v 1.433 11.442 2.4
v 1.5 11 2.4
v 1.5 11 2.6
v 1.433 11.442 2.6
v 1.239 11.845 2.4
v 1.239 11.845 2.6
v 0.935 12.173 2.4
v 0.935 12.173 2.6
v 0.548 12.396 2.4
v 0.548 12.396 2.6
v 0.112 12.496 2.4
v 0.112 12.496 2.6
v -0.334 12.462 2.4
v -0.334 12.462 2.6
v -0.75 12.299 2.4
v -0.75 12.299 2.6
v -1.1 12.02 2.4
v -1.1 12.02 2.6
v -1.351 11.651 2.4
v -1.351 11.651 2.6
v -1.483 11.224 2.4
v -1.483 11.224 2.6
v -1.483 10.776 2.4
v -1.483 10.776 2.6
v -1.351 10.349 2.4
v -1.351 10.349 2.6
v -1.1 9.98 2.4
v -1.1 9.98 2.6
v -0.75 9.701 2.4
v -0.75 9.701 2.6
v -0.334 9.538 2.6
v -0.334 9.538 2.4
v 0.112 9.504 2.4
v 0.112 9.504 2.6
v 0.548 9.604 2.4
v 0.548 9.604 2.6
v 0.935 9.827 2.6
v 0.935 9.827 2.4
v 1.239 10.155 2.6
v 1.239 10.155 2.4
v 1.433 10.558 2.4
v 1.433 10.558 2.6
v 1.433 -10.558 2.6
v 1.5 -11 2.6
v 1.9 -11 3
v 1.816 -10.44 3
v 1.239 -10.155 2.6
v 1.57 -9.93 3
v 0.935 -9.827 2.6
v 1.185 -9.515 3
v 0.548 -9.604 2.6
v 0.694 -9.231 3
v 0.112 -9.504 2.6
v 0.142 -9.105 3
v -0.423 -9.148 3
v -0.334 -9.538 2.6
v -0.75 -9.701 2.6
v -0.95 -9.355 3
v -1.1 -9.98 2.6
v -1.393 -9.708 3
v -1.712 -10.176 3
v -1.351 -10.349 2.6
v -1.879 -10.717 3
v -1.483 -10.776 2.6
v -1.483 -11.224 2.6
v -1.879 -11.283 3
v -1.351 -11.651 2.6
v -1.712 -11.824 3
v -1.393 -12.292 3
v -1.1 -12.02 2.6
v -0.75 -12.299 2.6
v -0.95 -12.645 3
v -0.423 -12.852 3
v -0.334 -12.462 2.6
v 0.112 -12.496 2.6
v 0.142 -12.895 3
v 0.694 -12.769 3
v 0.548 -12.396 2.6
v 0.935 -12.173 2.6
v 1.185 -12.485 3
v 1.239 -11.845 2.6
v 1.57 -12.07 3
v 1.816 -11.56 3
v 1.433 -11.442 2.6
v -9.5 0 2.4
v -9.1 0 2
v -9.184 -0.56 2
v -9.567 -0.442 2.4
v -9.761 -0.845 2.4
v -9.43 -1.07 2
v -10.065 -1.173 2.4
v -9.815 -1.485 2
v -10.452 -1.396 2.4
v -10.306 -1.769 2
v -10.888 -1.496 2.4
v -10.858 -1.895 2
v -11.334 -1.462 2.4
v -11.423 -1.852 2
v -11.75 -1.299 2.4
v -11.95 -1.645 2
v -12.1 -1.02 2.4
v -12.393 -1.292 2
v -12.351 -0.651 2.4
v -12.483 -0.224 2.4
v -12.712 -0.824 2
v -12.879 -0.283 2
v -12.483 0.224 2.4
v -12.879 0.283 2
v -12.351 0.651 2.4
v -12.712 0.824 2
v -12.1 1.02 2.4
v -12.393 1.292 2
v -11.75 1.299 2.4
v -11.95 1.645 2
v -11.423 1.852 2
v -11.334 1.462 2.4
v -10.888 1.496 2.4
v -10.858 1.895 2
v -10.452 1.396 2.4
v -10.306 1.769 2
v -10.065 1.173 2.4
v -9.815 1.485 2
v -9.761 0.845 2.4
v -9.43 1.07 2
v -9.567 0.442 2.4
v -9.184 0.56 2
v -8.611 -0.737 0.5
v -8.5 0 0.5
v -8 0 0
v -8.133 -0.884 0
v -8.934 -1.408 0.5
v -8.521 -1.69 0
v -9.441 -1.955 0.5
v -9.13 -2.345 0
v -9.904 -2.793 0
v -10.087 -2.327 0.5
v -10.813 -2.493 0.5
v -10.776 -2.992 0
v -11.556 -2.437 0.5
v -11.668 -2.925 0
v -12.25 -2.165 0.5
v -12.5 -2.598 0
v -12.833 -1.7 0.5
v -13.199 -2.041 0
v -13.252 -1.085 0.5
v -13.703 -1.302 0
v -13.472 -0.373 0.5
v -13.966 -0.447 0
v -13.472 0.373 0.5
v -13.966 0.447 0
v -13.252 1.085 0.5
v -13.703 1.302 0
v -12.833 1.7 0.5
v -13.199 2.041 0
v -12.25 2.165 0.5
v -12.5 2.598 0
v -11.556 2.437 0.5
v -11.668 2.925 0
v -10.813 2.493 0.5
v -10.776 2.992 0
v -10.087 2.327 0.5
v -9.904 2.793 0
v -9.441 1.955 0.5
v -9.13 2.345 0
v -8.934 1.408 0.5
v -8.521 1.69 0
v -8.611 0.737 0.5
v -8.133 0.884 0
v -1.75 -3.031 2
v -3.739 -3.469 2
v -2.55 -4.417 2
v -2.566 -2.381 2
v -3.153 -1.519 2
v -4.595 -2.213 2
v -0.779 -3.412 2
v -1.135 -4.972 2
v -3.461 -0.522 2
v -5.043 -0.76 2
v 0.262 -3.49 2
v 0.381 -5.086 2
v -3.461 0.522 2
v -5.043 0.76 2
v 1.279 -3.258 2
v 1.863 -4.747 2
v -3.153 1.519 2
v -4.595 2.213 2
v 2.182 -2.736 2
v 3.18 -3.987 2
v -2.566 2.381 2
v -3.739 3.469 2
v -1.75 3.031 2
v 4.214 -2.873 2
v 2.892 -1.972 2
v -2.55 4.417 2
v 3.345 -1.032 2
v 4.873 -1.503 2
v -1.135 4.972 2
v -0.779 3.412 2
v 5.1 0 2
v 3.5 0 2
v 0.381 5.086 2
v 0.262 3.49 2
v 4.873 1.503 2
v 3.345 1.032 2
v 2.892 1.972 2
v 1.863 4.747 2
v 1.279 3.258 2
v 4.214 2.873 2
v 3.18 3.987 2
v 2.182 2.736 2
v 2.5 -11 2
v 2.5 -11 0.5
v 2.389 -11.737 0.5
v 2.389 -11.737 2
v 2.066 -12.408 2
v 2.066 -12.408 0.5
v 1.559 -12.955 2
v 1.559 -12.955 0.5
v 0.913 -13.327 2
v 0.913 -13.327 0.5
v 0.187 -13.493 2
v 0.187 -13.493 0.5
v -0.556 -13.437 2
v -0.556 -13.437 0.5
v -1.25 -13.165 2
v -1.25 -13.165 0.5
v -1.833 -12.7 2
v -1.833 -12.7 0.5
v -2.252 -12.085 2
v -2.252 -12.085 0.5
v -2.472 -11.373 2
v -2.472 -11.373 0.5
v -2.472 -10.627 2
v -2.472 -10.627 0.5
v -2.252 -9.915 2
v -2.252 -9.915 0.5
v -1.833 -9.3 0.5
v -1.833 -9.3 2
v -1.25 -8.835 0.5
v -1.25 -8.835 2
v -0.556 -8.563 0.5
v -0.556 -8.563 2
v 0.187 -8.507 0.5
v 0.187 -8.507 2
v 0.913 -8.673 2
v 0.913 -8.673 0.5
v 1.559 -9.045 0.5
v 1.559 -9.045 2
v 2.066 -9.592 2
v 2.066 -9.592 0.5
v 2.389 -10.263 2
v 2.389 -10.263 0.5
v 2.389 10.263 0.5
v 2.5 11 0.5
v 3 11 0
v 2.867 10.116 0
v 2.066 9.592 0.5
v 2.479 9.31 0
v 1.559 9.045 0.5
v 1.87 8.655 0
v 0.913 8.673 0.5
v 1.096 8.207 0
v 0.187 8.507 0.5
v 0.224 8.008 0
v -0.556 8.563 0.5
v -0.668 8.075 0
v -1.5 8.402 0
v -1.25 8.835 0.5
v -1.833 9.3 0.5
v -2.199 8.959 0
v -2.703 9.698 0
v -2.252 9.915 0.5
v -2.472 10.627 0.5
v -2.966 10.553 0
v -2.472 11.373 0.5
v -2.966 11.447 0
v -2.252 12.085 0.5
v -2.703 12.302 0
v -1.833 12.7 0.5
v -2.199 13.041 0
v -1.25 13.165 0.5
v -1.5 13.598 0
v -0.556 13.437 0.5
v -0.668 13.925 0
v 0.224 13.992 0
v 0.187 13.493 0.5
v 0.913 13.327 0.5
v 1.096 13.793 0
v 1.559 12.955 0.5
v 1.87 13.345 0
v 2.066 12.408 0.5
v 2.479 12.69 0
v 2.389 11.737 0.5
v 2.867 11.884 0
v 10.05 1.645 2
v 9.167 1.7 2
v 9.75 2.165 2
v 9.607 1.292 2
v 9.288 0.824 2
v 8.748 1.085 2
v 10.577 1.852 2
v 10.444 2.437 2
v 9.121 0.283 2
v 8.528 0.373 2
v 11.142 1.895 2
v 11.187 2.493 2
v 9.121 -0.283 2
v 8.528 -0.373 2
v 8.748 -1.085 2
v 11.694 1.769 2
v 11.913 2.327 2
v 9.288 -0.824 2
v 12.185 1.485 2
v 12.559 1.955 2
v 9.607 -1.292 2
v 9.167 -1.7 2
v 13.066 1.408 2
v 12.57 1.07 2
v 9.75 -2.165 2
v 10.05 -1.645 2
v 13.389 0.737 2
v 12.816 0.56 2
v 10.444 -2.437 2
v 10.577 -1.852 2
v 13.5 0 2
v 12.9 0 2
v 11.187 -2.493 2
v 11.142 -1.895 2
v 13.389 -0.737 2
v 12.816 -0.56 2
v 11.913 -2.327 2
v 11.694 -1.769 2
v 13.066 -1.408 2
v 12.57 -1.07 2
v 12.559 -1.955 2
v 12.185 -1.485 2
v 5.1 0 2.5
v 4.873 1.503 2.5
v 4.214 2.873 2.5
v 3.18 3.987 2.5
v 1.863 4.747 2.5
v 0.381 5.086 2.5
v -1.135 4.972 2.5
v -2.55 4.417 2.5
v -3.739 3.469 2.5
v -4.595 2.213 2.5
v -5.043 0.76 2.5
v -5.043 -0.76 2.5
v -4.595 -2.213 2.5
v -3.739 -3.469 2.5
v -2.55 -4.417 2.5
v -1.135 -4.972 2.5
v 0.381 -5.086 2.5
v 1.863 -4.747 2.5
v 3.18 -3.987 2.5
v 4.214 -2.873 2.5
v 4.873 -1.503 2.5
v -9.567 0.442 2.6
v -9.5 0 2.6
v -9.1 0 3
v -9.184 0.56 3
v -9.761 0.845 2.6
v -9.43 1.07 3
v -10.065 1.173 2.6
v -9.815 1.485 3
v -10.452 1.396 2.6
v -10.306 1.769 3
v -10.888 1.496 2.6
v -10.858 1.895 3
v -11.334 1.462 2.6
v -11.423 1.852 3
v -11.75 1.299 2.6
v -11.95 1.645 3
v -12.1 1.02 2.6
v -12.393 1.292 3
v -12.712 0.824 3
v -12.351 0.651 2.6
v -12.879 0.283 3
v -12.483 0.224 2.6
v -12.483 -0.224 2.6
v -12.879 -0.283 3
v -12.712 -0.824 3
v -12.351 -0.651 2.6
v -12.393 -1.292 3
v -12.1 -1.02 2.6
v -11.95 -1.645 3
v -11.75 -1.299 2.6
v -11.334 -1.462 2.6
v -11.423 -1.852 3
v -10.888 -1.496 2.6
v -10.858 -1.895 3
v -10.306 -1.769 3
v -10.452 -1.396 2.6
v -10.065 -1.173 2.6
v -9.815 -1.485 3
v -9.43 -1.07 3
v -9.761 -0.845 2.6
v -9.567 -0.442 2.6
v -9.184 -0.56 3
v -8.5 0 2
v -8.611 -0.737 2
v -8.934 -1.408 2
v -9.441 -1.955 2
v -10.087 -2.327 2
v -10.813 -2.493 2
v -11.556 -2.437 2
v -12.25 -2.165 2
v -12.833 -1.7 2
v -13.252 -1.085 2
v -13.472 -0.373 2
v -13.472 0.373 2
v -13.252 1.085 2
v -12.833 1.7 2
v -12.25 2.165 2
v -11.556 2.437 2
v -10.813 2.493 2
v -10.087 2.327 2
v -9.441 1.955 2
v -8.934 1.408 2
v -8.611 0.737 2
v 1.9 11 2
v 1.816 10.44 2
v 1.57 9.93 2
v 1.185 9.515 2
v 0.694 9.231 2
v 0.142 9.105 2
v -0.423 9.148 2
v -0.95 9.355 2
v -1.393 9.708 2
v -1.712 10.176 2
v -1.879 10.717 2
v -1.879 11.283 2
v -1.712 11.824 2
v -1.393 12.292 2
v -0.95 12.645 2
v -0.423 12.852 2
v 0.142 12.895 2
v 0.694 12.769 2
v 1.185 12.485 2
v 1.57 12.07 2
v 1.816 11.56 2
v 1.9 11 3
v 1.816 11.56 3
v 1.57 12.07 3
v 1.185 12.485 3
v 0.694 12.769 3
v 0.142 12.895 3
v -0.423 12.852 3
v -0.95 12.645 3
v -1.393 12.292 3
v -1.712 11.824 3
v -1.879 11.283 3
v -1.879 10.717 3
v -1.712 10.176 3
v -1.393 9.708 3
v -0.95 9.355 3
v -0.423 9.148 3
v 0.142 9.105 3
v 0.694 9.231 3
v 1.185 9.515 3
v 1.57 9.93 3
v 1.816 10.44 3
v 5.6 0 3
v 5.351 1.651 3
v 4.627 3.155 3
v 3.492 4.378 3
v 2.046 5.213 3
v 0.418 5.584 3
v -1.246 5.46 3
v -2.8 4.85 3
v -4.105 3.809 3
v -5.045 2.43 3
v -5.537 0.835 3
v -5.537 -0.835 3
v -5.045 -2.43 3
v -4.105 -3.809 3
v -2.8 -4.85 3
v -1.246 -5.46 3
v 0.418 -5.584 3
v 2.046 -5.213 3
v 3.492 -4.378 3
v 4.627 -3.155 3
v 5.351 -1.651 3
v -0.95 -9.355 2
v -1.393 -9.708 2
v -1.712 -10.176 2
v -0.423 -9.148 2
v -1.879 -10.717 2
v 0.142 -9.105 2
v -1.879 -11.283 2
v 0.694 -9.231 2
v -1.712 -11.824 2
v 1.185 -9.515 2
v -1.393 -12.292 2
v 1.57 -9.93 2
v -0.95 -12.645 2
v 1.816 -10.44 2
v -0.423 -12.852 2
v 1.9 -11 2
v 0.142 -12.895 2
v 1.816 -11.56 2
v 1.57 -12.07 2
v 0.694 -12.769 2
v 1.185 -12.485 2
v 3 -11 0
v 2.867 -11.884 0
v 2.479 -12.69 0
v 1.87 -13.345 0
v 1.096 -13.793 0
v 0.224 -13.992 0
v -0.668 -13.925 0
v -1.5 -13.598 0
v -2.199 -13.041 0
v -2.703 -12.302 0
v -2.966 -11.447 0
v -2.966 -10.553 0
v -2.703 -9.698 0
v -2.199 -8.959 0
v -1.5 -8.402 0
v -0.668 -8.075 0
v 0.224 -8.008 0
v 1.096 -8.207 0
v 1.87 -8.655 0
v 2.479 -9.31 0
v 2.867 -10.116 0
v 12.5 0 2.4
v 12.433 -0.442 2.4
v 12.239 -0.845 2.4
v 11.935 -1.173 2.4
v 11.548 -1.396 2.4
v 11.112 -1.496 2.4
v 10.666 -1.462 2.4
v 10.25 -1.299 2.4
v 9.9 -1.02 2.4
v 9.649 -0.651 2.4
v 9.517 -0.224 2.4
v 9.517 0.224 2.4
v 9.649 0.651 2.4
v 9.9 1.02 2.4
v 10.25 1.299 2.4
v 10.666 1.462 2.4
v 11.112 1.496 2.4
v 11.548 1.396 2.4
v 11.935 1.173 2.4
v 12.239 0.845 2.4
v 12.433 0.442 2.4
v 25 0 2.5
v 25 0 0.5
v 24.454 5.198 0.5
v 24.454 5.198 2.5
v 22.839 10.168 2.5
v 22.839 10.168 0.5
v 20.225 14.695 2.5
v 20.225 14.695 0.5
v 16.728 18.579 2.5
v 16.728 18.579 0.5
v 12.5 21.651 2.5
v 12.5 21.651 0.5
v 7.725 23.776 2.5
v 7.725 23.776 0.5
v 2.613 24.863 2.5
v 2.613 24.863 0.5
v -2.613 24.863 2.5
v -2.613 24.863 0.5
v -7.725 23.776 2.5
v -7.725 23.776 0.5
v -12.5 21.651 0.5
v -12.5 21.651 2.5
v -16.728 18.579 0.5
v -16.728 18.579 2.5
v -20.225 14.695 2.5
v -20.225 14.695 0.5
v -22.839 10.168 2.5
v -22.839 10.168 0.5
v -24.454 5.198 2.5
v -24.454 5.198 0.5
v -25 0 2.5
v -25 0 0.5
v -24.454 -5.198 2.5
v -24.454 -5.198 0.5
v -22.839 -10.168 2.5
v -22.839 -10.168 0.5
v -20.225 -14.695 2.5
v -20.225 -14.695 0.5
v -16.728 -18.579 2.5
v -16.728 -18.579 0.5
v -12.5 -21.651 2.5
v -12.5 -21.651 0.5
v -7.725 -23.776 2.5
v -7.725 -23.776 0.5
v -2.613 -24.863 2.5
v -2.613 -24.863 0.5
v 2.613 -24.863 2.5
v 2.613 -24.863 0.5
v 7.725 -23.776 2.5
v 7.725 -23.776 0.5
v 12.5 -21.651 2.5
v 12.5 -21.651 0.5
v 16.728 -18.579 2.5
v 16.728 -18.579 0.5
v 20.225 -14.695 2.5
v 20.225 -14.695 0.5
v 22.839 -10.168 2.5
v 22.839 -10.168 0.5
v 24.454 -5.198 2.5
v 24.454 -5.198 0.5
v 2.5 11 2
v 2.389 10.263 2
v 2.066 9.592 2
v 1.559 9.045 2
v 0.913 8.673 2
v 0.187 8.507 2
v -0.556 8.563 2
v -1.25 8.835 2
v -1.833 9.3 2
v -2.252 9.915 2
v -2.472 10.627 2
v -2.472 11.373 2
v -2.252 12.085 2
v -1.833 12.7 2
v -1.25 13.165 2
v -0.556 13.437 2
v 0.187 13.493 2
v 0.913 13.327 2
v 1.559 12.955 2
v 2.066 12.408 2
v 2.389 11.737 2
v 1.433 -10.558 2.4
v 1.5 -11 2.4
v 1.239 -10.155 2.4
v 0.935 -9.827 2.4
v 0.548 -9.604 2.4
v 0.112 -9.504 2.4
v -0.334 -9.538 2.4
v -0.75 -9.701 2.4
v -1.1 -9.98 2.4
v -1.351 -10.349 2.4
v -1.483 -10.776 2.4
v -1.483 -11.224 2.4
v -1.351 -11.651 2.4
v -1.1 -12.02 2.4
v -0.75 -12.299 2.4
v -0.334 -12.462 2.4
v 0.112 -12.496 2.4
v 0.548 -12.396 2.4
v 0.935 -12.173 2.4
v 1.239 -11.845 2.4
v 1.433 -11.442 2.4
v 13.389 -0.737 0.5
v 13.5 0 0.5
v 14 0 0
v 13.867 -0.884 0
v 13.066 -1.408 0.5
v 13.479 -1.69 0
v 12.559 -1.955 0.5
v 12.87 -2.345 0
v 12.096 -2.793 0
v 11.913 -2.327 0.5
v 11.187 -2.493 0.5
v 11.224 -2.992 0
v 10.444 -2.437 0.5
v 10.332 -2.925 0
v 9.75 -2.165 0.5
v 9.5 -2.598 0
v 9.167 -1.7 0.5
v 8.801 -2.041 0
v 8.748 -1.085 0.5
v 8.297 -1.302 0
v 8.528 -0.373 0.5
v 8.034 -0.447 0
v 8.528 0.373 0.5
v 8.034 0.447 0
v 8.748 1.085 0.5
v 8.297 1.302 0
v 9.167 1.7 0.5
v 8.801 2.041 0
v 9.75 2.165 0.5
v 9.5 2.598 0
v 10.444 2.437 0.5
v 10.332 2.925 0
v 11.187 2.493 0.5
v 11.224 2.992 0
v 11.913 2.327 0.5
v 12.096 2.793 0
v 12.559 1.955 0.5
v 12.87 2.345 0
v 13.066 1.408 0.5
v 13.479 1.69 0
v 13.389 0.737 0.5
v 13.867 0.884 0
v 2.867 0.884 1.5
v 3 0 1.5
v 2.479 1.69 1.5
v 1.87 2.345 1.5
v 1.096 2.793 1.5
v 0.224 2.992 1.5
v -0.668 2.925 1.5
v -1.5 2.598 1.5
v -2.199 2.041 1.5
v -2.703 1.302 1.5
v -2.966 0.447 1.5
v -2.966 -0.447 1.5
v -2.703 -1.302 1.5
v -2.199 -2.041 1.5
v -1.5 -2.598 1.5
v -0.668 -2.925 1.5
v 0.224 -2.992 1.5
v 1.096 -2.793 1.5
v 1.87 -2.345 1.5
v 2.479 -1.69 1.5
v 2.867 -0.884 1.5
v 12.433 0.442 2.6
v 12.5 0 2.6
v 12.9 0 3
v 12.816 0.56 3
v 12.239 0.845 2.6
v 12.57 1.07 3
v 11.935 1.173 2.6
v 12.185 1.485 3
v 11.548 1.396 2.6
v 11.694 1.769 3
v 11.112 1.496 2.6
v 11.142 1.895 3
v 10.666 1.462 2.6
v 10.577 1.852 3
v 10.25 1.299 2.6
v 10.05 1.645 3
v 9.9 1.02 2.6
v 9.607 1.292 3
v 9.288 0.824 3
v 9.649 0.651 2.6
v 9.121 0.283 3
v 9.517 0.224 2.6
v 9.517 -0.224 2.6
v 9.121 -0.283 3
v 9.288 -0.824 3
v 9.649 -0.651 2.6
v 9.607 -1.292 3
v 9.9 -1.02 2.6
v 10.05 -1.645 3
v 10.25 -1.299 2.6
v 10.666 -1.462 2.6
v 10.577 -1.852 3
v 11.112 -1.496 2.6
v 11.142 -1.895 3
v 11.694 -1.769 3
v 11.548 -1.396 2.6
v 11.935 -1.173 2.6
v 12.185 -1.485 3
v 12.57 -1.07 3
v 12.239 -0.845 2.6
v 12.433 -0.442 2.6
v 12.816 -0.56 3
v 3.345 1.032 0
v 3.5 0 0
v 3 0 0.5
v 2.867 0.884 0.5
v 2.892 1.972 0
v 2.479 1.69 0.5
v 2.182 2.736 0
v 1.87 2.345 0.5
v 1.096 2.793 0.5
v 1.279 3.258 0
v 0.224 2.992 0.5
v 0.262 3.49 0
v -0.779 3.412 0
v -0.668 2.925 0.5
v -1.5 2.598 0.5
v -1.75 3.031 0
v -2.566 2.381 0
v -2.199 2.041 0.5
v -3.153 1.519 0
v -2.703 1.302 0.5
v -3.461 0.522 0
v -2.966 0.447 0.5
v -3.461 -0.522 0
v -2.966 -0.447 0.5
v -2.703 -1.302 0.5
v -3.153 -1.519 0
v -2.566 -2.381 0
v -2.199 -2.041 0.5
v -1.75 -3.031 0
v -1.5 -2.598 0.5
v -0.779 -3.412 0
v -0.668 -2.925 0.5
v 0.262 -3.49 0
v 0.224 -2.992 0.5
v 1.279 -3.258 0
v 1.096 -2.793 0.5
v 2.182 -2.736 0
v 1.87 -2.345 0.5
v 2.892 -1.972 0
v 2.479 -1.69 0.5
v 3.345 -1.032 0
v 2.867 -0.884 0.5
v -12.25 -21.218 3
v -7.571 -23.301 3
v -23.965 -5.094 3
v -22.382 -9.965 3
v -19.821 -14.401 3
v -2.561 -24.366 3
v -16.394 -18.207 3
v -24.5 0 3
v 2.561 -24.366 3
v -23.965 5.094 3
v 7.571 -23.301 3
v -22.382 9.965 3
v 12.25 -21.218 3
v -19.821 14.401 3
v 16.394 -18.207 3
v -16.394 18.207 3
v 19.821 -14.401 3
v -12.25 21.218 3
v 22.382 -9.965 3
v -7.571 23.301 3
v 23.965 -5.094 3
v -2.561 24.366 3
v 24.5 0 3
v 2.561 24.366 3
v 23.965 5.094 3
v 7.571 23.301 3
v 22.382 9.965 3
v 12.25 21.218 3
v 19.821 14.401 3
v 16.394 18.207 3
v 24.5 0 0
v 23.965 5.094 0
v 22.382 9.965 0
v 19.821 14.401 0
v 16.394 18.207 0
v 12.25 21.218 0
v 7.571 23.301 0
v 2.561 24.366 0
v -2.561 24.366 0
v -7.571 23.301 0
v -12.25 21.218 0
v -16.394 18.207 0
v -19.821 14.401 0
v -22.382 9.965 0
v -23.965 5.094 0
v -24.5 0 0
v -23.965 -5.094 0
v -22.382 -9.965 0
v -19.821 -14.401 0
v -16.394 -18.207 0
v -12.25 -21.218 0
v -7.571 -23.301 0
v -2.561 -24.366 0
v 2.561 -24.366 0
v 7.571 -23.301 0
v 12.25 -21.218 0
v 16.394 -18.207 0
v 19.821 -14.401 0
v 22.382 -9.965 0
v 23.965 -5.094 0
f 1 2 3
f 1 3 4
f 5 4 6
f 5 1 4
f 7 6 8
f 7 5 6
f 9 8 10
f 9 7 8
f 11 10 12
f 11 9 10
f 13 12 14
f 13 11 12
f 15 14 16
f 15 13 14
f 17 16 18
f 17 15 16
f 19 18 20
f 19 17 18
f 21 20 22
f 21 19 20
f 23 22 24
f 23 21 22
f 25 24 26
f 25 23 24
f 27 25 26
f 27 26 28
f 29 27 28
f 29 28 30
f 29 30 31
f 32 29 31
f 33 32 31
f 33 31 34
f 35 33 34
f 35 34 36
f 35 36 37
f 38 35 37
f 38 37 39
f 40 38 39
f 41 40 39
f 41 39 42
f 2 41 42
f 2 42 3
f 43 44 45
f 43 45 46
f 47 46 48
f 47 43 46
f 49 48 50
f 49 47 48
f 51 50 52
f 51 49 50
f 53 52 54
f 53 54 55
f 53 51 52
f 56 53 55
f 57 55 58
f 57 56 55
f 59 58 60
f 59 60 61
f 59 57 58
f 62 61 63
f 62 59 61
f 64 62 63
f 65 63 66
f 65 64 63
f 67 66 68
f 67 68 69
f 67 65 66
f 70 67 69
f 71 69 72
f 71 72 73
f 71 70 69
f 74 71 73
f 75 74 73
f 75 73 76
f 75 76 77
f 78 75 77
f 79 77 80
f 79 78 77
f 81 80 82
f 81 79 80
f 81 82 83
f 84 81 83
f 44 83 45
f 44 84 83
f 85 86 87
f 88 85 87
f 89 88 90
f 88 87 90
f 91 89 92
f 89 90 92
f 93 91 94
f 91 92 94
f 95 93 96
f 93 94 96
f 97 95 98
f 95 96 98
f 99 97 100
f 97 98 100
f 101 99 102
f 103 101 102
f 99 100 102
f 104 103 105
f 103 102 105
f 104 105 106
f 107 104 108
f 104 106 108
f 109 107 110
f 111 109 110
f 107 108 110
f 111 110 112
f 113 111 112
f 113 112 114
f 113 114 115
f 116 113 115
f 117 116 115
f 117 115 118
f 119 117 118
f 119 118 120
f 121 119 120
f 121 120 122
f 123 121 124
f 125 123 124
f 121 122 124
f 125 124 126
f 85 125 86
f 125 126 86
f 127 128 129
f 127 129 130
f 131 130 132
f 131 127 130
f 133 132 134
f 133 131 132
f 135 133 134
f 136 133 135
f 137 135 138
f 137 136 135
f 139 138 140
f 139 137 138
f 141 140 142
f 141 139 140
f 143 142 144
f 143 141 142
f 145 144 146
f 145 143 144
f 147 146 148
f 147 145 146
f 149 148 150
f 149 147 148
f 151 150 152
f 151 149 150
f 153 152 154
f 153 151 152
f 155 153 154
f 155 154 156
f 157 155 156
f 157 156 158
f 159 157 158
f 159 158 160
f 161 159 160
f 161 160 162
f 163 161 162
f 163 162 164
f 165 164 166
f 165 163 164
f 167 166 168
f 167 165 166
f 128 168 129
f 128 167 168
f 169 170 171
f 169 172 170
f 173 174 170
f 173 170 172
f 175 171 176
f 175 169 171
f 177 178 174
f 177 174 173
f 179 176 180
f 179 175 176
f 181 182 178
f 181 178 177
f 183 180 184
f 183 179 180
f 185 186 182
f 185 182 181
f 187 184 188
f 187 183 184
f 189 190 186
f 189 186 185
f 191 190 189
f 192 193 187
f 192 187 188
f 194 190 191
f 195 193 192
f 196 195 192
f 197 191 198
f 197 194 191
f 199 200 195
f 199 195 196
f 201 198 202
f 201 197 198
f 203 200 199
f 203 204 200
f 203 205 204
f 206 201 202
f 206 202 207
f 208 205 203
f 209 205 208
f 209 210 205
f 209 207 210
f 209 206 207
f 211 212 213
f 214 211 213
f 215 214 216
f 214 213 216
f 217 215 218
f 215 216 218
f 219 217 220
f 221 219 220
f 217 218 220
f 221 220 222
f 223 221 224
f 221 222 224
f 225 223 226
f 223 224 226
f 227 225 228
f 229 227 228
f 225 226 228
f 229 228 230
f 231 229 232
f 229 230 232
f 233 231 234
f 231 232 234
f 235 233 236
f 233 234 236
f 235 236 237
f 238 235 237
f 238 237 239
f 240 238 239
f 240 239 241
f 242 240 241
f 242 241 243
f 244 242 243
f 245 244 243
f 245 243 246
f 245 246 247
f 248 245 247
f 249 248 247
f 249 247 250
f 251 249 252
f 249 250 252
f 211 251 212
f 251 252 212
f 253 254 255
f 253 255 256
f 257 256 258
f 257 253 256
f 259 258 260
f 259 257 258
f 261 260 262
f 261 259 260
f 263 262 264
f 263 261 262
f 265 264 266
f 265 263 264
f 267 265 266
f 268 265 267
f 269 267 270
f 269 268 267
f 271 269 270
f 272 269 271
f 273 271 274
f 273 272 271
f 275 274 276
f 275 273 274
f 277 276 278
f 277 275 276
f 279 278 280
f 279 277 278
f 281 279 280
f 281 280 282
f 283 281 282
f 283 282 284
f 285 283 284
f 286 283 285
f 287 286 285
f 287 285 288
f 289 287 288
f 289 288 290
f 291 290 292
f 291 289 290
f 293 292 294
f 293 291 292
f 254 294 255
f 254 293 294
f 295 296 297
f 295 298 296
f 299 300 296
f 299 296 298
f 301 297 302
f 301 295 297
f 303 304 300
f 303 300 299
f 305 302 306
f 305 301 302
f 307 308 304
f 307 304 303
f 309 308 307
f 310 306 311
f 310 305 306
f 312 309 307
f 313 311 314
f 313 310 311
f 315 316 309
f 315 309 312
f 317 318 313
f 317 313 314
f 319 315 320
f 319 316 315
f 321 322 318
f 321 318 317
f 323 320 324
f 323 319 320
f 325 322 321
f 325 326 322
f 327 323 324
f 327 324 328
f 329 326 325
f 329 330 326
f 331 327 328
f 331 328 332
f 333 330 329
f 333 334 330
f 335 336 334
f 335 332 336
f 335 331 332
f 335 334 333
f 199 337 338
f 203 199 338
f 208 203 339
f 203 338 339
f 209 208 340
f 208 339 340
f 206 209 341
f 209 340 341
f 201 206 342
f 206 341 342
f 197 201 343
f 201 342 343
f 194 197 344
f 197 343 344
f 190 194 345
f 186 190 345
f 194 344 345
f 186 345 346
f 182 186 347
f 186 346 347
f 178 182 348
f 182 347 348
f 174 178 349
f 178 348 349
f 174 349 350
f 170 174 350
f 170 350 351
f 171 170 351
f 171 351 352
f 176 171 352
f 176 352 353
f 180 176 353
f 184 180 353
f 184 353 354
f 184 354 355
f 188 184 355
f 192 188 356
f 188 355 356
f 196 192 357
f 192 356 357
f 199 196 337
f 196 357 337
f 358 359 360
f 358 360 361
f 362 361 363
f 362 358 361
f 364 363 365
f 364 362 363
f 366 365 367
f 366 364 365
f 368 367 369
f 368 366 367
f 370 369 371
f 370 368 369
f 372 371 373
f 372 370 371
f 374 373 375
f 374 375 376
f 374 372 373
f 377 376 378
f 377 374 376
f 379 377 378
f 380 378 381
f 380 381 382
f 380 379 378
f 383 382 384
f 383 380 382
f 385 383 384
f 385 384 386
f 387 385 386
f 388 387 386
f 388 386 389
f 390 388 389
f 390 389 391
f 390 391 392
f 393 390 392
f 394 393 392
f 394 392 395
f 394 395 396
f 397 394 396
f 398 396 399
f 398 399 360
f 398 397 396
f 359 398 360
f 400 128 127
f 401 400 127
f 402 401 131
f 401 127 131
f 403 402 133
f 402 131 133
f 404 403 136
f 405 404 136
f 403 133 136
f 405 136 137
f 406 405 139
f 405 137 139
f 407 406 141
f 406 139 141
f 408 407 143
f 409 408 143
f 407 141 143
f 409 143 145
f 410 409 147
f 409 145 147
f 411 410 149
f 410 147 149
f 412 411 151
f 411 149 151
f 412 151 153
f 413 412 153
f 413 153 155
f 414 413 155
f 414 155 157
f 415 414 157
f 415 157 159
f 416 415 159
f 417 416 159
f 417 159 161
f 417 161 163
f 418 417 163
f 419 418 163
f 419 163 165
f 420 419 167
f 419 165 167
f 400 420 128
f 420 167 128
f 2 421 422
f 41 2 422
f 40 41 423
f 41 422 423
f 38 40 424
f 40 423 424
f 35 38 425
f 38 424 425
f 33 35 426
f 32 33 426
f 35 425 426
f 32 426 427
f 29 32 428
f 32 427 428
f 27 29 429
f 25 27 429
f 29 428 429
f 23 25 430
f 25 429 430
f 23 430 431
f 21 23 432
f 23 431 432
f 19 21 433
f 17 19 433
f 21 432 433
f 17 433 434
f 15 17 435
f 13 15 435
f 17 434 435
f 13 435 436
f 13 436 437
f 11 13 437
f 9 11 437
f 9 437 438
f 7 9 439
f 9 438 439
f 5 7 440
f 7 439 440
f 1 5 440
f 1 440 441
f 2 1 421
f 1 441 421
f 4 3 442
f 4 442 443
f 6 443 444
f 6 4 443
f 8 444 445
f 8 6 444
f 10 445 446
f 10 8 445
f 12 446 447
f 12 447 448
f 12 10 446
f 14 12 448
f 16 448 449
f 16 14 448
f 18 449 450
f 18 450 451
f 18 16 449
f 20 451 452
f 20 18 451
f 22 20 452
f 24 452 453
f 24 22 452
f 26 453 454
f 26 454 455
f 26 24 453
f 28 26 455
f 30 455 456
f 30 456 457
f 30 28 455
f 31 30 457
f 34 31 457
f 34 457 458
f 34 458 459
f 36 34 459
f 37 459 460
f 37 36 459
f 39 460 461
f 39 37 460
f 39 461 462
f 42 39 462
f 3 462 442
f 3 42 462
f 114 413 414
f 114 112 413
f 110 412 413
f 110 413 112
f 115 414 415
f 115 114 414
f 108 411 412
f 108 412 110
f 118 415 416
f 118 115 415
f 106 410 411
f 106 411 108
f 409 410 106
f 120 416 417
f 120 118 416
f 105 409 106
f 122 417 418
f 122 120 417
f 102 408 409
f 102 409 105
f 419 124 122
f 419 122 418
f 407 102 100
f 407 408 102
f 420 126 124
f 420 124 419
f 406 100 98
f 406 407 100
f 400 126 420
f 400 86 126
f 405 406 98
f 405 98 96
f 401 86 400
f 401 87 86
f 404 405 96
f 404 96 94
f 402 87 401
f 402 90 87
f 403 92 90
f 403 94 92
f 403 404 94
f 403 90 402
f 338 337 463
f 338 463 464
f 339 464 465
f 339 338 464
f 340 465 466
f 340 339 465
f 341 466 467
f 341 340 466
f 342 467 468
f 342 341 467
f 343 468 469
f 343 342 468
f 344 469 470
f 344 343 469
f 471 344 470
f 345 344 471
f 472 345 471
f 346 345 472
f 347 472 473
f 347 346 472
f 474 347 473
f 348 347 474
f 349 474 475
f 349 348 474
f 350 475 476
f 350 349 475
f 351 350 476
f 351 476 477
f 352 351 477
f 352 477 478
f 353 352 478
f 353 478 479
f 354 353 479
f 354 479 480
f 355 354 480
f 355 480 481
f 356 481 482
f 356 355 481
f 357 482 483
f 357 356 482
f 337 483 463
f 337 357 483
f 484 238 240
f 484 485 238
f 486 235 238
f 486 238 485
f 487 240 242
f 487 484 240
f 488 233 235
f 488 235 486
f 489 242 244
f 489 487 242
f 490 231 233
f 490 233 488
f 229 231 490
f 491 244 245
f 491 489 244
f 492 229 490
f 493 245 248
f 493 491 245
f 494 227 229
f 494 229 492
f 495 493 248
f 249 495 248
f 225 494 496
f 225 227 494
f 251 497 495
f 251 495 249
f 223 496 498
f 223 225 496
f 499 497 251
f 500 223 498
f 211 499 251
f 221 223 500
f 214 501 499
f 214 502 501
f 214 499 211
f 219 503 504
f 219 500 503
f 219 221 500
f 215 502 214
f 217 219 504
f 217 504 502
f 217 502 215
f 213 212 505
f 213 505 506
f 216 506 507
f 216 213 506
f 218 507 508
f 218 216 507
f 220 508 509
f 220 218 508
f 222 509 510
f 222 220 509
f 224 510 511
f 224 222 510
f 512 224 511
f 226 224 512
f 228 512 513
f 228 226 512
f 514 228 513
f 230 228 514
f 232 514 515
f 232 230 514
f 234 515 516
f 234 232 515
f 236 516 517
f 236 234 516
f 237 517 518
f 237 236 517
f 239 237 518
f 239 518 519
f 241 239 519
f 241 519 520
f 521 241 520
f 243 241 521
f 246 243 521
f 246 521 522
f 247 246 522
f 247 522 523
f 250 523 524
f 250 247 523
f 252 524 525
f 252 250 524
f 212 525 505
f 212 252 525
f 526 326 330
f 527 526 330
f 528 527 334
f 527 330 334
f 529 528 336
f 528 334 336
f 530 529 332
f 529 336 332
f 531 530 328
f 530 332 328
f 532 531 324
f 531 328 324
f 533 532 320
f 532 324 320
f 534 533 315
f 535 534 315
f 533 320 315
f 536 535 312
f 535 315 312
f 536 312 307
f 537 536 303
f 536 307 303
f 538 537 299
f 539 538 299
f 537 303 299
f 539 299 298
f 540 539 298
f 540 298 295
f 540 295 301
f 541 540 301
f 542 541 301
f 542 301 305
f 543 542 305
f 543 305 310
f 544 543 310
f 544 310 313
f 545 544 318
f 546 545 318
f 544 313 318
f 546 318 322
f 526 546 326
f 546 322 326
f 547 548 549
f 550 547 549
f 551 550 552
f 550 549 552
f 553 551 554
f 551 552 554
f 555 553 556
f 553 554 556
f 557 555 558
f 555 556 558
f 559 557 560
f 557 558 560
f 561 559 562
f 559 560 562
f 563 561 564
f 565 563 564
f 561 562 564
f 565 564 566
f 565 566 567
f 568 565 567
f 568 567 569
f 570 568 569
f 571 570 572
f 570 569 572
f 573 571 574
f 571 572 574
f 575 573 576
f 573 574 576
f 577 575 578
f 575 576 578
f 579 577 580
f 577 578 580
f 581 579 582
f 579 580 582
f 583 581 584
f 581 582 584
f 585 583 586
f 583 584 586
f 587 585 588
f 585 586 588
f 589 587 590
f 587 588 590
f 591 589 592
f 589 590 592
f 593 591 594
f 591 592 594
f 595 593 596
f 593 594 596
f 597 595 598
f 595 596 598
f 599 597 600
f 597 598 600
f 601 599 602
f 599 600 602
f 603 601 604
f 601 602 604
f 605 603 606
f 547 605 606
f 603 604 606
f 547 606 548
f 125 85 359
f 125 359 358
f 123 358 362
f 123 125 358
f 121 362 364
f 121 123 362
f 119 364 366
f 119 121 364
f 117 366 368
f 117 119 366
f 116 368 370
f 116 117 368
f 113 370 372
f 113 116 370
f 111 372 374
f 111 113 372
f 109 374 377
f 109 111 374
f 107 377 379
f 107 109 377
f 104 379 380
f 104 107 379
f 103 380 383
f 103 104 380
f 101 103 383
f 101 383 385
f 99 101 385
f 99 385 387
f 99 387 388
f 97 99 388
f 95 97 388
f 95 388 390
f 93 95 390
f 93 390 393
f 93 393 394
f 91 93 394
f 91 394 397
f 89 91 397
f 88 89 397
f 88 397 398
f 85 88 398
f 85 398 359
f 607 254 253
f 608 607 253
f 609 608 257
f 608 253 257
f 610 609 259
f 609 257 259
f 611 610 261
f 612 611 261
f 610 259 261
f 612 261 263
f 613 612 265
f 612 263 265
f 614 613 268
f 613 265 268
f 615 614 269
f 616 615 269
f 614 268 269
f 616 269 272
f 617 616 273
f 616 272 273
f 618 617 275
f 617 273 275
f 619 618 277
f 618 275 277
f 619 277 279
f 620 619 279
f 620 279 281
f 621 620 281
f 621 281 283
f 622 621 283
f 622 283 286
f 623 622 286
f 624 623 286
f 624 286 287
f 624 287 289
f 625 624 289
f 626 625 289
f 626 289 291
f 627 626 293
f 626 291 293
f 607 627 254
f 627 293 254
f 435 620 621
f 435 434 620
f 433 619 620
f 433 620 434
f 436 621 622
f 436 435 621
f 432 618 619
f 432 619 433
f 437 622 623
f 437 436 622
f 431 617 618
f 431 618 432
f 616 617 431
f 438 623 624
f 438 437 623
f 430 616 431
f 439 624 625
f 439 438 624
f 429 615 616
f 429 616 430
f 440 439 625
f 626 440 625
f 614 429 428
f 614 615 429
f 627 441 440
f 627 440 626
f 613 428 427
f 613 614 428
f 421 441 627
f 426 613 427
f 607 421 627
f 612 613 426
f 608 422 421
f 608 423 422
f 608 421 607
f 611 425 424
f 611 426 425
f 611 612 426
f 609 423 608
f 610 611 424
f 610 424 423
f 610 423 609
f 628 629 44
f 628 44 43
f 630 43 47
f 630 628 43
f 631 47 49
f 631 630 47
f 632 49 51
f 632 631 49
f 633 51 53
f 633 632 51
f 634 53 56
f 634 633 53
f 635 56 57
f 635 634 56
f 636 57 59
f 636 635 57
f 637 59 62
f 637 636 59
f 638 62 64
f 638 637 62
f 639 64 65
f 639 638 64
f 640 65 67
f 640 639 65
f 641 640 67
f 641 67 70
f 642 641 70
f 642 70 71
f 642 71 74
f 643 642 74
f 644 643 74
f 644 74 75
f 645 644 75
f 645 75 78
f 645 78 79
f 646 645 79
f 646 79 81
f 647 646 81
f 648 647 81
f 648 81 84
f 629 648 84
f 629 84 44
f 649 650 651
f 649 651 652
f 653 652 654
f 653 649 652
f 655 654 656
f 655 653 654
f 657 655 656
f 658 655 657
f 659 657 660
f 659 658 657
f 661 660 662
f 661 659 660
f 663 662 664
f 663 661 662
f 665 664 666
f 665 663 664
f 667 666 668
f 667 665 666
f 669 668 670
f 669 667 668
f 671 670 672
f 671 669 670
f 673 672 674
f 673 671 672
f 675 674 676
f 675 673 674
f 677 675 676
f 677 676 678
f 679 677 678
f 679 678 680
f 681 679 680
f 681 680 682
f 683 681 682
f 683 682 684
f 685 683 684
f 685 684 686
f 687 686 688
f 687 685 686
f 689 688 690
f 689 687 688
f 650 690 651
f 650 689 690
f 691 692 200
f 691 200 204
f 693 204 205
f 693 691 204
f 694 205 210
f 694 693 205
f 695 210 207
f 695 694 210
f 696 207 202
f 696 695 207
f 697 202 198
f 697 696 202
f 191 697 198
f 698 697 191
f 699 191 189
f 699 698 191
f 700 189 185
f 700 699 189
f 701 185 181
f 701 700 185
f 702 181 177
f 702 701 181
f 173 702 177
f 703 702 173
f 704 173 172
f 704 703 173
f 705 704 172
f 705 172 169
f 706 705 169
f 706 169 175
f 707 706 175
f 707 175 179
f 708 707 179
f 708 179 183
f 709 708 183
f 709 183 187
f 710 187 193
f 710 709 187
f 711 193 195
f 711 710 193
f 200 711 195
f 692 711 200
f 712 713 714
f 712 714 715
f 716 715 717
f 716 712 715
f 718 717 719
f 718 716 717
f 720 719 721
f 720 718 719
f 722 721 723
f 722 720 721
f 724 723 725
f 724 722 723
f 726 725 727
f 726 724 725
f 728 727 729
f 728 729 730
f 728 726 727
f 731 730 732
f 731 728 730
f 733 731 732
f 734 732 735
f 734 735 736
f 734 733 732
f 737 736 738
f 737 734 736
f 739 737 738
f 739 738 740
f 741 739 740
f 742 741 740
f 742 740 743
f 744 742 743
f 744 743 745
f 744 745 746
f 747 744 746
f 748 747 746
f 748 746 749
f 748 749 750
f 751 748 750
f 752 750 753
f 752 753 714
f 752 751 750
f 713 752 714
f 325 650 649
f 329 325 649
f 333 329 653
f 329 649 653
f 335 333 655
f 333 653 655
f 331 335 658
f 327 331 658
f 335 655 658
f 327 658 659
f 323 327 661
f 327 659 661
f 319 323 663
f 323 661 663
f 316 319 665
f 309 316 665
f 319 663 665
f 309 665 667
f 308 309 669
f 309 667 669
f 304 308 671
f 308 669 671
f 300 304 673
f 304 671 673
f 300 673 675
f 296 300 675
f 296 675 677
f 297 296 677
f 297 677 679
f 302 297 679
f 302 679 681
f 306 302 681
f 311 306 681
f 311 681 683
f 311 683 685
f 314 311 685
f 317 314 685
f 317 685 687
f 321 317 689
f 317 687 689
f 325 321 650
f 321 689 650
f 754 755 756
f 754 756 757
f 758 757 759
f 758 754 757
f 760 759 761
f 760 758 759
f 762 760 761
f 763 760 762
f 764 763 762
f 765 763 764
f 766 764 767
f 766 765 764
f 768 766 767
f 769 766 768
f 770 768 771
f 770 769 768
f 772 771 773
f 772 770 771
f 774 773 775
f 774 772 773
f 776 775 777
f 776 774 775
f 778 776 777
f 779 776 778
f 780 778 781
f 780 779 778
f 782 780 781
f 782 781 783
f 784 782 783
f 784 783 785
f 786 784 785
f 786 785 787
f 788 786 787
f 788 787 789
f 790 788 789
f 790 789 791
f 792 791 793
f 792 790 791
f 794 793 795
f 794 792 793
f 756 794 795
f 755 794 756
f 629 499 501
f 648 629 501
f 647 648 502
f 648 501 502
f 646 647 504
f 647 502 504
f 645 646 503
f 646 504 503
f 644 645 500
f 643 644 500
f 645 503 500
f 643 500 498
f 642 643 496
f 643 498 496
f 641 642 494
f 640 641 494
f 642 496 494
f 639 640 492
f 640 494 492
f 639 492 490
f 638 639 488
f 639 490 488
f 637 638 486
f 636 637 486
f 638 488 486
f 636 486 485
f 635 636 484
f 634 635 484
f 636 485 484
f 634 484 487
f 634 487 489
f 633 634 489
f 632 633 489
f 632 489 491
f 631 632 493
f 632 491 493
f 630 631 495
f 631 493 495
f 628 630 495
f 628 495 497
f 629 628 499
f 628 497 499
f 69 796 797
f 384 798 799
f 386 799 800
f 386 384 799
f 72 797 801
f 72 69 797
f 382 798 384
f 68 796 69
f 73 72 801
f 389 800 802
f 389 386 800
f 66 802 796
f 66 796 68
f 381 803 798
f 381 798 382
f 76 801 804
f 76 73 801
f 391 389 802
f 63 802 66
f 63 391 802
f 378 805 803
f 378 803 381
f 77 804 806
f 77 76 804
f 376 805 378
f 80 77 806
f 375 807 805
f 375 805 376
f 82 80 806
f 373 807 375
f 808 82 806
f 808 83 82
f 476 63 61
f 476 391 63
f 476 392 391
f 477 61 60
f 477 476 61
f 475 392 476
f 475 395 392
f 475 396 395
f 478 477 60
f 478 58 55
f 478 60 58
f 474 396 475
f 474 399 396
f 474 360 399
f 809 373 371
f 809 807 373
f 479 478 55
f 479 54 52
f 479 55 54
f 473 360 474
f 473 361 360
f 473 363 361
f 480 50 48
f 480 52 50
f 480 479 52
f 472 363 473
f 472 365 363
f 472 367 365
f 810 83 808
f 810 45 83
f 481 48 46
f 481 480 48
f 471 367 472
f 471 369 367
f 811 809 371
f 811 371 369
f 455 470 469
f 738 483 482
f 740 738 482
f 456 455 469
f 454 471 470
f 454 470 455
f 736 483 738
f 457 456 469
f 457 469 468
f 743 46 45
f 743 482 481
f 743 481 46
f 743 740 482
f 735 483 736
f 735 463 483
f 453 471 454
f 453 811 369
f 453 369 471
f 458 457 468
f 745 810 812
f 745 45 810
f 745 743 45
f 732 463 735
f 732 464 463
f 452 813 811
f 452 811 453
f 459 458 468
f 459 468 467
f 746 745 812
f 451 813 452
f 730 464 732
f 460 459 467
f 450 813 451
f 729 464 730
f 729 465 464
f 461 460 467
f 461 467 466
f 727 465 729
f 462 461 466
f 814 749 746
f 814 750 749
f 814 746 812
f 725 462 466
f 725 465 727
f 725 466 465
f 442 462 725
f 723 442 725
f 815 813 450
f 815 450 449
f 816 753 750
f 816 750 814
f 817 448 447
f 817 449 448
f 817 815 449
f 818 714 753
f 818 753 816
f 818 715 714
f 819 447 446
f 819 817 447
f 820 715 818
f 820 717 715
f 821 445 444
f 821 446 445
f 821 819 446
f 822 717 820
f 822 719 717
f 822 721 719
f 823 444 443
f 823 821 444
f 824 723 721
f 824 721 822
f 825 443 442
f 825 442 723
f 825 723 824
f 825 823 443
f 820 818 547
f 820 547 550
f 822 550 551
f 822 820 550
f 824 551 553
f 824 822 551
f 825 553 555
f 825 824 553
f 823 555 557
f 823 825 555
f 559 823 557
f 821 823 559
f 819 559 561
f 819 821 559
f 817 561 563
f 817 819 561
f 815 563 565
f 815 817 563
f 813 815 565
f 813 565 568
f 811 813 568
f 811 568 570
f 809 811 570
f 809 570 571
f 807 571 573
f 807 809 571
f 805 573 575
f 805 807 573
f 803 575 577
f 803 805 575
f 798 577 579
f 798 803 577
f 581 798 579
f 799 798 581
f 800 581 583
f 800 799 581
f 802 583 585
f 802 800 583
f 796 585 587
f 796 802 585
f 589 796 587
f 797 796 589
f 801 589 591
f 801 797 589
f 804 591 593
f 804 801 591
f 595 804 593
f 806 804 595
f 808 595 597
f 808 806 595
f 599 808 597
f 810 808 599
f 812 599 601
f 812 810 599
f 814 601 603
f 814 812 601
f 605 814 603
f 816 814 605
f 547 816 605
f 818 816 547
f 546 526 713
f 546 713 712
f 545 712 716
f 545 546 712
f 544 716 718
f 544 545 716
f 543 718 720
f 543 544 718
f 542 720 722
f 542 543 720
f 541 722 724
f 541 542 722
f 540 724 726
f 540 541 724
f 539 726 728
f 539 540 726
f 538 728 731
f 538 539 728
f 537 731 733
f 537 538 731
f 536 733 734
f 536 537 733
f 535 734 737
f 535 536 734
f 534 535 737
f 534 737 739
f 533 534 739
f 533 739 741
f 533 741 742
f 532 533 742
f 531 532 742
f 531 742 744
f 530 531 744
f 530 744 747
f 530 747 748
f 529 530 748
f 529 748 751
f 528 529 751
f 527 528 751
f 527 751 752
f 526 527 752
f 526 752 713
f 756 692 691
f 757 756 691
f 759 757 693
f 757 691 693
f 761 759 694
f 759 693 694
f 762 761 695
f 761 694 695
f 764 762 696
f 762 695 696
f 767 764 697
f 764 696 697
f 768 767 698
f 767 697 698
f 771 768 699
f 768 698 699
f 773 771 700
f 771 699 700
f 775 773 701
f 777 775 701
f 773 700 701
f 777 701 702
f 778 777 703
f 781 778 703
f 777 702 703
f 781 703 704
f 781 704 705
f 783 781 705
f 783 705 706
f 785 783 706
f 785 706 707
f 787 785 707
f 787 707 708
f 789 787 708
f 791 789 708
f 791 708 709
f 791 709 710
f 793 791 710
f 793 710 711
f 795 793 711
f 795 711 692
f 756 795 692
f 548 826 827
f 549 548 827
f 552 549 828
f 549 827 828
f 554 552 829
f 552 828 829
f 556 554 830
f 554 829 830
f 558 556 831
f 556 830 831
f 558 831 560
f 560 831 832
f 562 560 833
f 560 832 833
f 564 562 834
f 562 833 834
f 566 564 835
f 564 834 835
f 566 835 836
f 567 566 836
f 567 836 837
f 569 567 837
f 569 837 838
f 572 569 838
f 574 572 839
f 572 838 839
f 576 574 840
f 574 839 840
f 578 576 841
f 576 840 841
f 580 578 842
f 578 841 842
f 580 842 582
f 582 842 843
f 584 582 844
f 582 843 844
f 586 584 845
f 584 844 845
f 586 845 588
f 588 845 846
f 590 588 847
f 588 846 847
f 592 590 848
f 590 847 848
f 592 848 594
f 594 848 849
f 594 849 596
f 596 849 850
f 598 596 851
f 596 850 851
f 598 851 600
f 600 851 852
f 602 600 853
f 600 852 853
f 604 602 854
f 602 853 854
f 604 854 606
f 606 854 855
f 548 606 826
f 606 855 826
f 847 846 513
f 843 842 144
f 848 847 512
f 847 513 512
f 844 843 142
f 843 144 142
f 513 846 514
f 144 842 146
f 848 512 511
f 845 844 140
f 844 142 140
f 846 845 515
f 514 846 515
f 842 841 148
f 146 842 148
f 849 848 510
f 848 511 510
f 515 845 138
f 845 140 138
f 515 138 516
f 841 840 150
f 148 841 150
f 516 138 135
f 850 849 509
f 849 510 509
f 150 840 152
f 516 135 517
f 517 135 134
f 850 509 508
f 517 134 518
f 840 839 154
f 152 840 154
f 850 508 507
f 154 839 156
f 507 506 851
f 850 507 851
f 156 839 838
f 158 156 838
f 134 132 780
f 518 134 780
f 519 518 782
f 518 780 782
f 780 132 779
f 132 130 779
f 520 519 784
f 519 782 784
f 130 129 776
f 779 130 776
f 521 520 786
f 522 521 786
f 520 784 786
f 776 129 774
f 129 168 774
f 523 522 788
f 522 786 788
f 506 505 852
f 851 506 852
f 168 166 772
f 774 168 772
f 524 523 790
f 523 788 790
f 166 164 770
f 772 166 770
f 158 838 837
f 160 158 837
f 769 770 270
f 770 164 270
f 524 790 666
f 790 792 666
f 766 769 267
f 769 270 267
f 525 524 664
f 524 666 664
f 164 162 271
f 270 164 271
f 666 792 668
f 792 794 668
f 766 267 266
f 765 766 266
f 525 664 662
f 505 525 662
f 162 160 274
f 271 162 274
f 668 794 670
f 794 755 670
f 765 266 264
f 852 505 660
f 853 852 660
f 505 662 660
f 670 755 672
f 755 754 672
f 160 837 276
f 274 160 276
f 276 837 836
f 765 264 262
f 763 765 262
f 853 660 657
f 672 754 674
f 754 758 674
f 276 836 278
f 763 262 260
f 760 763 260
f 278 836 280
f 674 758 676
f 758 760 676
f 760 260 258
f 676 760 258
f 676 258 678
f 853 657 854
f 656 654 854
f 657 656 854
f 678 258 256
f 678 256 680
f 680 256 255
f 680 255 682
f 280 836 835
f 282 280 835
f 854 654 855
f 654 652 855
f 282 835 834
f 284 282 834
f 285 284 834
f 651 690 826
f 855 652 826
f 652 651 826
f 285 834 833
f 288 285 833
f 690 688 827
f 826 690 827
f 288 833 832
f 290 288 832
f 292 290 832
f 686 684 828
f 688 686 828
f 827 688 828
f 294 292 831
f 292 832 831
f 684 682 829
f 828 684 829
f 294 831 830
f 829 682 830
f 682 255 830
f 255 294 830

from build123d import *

# Parameters (mm, degrees)
SKETCH_R        = 25
SKETCH_R_2      = 1.5
PAD_DEPTH       = 3
SKETCH002_R     = 3
POCKET_DEPTH    = 4
SKETCH001_R     = 5.1
POCKET001_DEPTH = 1
SKETCH003_R     = 2.5
POCKET002_DEPTH = 2
CHAMFER_SIZE    = 0.5
CHAMFER001_SIZE = 0.5
CHAMFER002_SIZE = 0.5
CHAMFER003_SIZE = 0.4
CHAMFER004_SIZE = 0.5


with BuildPart() as part:
    # Sketch → Pad (new body)
    with BuildSketch(Plane.XY):
        Circle(SKETCH_R)
        with Locations((0, 11)):
            Circle(SKETCH_R_2, mode=Mode.SUBTRACT)
        with Locations((-11, 0)):
            Circle(SKETCH_R_2, mode=Mode.SUBTRACT)
        with Locations((0, -11)):
            Circle(SKETCH_R_2, mode=Mode.SUBTRACT)
        with Locations((11, 0)):
            Circle(SKETCH_R_2, mode=Mode.SUBTRACT)
    extrude(amount=PAD_DEPTH)

    # Sketch002 (on Face7 of Pad) → Pocket (cut)
    with BuildSketch(Plane.XY.offset(3)):
        Circle(SKETCH002_R)
    extrude(amount=-POCKET_DEPTH, mode=Mode.SUBTRACT)

    # Sketch001 (on Face7 of Pad) → Pocket001 (cut)
    with BuildSketch(Plane.XY.offset(3)):
        Circle(SKETCH001_R)
    extrude(amount=-POCKET001_DEPTH, mode=Mode.SUBTRACT)

    # Sketch003 (on Face2 of Pocket001) → Pocket002 (cut)
    with BuildSketch(Plane(origin=(0, 0, 0), x_dir=(1, 0, 0), z_dir=(0, 0, -1))):
        with Locations((0, 11)):
            Circle(SKETCH003_R)
        with Locations((11, 0)):
            Circle(SKETCH003_R)
        with Locations((0, -11)):
            Circle(SKETCH003_R)
        with Locations((-11, 0)):
            Circle(SKETCH003_R)
    extrude(amount=-POCKET002_DEPTH, mode=Mode.SUBTRACT)

    # Chamfer
    chamfer_edges = [part.edges().sort_by_distance(p)[0] for p in [
        (-25, 0, 3),
        (-25, 0, 0),
    ]]
    chamfer(chamfer_edges, length=CHAMFER_SIZE)

    # Chamfer001
    chamfer001_edges = [part.edges().sort_by_distance(p)[0] for p in [
        (-5.1, 0, 3),
    ]]
    chamfer(chamfer001_edges, length=CHAMFER001_SIZE)

    # Chamfer002
    chamfer002_edges = [part.edges().sort_by_distance(p)[0] for p in [
        (-3, 0, 2),
        (-3, 0, 0),
    ]]
    chamfer(chamfer002_edges, length=CHAMFER002_SIZE)

    # Chamfer003
    chamfer003_edges = [part.edges().sort_by_distance(p)[0] for p in [
        (-1.5, 11, 3),
        (-1.5, 11, 2),
        (-12.5, 0, 3),
        (-12.5, 0, 2),
        (9.5, 0, 3),
        (9.5, 0, 2),
        (-1.5, -11, 3),
        (-1.5, -11, 2),
    ]]
    chamfer(chamfer003_edges, length=CHAMFER003_SIZE)

    # Chamfer004
    chamfer004_edges = [part.edges().sort_by_distance(p)[0] for p in [
        (-13.5, 0, 0),
        (-2.5, 11, 0),
        (8.5, 0, 0),
        (-2.5, -11, 0),
    ]]
    chamfer(chamfer004_edges, length=CHAMFER004_SIZE)


solid = part.part
